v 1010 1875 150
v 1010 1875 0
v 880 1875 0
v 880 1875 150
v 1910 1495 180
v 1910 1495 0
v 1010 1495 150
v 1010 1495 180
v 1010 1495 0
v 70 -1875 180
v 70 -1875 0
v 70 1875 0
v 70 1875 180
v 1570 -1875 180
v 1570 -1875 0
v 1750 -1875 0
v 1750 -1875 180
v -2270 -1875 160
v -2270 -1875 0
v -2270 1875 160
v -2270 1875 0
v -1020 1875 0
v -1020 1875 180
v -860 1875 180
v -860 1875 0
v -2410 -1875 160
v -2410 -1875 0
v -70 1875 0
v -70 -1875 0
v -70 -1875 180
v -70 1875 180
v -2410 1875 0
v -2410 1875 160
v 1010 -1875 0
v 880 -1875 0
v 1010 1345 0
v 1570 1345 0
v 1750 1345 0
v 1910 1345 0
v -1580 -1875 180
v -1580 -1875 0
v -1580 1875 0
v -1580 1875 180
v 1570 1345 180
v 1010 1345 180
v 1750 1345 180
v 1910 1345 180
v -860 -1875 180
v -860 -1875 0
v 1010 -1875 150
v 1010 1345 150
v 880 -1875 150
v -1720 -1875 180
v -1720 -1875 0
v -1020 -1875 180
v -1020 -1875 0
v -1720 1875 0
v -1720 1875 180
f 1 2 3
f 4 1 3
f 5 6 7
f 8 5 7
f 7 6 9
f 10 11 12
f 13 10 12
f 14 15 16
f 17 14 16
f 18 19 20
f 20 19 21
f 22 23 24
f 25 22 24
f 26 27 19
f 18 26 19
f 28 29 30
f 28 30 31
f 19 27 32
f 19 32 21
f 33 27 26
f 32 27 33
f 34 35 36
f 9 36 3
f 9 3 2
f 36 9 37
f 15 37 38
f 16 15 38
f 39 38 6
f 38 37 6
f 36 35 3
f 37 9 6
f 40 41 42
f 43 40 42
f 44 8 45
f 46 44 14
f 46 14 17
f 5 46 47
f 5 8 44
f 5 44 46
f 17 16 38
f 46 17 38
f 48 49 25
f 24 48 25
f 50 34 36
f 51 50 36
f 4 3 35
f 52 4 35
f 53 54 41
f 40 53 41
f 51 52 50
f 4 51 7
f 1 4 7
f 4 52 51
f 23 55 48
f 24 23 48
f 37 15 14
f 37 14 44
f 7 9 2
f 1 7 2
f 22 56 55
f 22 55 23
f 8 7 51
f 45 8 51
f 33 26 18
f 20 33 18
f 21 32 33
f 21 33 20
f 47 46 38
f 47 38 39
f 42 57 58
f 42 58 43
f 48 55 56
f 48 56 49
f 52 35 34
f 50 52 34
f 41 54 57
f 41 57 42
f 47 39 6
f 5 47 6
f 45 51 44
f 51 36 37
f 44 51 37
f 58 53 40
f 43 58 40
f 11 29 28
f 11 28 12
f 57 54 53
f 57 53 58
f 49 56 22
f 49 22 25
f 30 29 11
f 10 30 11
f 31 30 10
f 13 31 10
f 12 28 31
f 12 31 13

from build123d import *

# Parameters (mm, degrees)
F0_W     = 180
F0_H     = 3220
F0_W_2   = 140
F0_H_2   = 3750
F0_W_3   = 160
F1_DEPTH = 180
F2_DEPTH = 150
F3_DEPTH = 160


with BuildPart() as f1:
    # F0 (on Top) → F1 (new body)
    with BuildSketch(Plane.XY):
        Polygon((1910, 1495), (1010, 1495), (1010, 1345), (1570, 1345), (1750, 1345), (1910, 1345), align=None)
        with Locations((1660, -265)):
            Rectangle(F0_W, F0_H)
        Rectangle(F0_W_2, F0_H_2)
        with Locations((-940, 0)):
            Rectangle(F0_W_3, F0_H_2)
        with Locations((-1650, 0)):
            Rectangle(F0_W_2, F0_H_2)
    extrude(amount=F1_DEPTH)

    # F0 (on Top) → F2 (join)
    with BuildSketch(Plane.XY):
        Polygon((1010, 1875), (880, 1875), (880, -1875), (1010, -1875), (1010, 1345), (1010, 1495), align=None)
    extrude(amount=F2_DEPTH)


with BuildPart() as f3:
    # F0 (on Top) → F3 (new body)
    with BuildSketch(Plane.XY):
        with Locations((-2340, 0)):
            Rectangle(F0_W_2, F0_H_2)
    extrude(amount=F3_DEPTH)


solid = Compound([f1.part, f3.part])
